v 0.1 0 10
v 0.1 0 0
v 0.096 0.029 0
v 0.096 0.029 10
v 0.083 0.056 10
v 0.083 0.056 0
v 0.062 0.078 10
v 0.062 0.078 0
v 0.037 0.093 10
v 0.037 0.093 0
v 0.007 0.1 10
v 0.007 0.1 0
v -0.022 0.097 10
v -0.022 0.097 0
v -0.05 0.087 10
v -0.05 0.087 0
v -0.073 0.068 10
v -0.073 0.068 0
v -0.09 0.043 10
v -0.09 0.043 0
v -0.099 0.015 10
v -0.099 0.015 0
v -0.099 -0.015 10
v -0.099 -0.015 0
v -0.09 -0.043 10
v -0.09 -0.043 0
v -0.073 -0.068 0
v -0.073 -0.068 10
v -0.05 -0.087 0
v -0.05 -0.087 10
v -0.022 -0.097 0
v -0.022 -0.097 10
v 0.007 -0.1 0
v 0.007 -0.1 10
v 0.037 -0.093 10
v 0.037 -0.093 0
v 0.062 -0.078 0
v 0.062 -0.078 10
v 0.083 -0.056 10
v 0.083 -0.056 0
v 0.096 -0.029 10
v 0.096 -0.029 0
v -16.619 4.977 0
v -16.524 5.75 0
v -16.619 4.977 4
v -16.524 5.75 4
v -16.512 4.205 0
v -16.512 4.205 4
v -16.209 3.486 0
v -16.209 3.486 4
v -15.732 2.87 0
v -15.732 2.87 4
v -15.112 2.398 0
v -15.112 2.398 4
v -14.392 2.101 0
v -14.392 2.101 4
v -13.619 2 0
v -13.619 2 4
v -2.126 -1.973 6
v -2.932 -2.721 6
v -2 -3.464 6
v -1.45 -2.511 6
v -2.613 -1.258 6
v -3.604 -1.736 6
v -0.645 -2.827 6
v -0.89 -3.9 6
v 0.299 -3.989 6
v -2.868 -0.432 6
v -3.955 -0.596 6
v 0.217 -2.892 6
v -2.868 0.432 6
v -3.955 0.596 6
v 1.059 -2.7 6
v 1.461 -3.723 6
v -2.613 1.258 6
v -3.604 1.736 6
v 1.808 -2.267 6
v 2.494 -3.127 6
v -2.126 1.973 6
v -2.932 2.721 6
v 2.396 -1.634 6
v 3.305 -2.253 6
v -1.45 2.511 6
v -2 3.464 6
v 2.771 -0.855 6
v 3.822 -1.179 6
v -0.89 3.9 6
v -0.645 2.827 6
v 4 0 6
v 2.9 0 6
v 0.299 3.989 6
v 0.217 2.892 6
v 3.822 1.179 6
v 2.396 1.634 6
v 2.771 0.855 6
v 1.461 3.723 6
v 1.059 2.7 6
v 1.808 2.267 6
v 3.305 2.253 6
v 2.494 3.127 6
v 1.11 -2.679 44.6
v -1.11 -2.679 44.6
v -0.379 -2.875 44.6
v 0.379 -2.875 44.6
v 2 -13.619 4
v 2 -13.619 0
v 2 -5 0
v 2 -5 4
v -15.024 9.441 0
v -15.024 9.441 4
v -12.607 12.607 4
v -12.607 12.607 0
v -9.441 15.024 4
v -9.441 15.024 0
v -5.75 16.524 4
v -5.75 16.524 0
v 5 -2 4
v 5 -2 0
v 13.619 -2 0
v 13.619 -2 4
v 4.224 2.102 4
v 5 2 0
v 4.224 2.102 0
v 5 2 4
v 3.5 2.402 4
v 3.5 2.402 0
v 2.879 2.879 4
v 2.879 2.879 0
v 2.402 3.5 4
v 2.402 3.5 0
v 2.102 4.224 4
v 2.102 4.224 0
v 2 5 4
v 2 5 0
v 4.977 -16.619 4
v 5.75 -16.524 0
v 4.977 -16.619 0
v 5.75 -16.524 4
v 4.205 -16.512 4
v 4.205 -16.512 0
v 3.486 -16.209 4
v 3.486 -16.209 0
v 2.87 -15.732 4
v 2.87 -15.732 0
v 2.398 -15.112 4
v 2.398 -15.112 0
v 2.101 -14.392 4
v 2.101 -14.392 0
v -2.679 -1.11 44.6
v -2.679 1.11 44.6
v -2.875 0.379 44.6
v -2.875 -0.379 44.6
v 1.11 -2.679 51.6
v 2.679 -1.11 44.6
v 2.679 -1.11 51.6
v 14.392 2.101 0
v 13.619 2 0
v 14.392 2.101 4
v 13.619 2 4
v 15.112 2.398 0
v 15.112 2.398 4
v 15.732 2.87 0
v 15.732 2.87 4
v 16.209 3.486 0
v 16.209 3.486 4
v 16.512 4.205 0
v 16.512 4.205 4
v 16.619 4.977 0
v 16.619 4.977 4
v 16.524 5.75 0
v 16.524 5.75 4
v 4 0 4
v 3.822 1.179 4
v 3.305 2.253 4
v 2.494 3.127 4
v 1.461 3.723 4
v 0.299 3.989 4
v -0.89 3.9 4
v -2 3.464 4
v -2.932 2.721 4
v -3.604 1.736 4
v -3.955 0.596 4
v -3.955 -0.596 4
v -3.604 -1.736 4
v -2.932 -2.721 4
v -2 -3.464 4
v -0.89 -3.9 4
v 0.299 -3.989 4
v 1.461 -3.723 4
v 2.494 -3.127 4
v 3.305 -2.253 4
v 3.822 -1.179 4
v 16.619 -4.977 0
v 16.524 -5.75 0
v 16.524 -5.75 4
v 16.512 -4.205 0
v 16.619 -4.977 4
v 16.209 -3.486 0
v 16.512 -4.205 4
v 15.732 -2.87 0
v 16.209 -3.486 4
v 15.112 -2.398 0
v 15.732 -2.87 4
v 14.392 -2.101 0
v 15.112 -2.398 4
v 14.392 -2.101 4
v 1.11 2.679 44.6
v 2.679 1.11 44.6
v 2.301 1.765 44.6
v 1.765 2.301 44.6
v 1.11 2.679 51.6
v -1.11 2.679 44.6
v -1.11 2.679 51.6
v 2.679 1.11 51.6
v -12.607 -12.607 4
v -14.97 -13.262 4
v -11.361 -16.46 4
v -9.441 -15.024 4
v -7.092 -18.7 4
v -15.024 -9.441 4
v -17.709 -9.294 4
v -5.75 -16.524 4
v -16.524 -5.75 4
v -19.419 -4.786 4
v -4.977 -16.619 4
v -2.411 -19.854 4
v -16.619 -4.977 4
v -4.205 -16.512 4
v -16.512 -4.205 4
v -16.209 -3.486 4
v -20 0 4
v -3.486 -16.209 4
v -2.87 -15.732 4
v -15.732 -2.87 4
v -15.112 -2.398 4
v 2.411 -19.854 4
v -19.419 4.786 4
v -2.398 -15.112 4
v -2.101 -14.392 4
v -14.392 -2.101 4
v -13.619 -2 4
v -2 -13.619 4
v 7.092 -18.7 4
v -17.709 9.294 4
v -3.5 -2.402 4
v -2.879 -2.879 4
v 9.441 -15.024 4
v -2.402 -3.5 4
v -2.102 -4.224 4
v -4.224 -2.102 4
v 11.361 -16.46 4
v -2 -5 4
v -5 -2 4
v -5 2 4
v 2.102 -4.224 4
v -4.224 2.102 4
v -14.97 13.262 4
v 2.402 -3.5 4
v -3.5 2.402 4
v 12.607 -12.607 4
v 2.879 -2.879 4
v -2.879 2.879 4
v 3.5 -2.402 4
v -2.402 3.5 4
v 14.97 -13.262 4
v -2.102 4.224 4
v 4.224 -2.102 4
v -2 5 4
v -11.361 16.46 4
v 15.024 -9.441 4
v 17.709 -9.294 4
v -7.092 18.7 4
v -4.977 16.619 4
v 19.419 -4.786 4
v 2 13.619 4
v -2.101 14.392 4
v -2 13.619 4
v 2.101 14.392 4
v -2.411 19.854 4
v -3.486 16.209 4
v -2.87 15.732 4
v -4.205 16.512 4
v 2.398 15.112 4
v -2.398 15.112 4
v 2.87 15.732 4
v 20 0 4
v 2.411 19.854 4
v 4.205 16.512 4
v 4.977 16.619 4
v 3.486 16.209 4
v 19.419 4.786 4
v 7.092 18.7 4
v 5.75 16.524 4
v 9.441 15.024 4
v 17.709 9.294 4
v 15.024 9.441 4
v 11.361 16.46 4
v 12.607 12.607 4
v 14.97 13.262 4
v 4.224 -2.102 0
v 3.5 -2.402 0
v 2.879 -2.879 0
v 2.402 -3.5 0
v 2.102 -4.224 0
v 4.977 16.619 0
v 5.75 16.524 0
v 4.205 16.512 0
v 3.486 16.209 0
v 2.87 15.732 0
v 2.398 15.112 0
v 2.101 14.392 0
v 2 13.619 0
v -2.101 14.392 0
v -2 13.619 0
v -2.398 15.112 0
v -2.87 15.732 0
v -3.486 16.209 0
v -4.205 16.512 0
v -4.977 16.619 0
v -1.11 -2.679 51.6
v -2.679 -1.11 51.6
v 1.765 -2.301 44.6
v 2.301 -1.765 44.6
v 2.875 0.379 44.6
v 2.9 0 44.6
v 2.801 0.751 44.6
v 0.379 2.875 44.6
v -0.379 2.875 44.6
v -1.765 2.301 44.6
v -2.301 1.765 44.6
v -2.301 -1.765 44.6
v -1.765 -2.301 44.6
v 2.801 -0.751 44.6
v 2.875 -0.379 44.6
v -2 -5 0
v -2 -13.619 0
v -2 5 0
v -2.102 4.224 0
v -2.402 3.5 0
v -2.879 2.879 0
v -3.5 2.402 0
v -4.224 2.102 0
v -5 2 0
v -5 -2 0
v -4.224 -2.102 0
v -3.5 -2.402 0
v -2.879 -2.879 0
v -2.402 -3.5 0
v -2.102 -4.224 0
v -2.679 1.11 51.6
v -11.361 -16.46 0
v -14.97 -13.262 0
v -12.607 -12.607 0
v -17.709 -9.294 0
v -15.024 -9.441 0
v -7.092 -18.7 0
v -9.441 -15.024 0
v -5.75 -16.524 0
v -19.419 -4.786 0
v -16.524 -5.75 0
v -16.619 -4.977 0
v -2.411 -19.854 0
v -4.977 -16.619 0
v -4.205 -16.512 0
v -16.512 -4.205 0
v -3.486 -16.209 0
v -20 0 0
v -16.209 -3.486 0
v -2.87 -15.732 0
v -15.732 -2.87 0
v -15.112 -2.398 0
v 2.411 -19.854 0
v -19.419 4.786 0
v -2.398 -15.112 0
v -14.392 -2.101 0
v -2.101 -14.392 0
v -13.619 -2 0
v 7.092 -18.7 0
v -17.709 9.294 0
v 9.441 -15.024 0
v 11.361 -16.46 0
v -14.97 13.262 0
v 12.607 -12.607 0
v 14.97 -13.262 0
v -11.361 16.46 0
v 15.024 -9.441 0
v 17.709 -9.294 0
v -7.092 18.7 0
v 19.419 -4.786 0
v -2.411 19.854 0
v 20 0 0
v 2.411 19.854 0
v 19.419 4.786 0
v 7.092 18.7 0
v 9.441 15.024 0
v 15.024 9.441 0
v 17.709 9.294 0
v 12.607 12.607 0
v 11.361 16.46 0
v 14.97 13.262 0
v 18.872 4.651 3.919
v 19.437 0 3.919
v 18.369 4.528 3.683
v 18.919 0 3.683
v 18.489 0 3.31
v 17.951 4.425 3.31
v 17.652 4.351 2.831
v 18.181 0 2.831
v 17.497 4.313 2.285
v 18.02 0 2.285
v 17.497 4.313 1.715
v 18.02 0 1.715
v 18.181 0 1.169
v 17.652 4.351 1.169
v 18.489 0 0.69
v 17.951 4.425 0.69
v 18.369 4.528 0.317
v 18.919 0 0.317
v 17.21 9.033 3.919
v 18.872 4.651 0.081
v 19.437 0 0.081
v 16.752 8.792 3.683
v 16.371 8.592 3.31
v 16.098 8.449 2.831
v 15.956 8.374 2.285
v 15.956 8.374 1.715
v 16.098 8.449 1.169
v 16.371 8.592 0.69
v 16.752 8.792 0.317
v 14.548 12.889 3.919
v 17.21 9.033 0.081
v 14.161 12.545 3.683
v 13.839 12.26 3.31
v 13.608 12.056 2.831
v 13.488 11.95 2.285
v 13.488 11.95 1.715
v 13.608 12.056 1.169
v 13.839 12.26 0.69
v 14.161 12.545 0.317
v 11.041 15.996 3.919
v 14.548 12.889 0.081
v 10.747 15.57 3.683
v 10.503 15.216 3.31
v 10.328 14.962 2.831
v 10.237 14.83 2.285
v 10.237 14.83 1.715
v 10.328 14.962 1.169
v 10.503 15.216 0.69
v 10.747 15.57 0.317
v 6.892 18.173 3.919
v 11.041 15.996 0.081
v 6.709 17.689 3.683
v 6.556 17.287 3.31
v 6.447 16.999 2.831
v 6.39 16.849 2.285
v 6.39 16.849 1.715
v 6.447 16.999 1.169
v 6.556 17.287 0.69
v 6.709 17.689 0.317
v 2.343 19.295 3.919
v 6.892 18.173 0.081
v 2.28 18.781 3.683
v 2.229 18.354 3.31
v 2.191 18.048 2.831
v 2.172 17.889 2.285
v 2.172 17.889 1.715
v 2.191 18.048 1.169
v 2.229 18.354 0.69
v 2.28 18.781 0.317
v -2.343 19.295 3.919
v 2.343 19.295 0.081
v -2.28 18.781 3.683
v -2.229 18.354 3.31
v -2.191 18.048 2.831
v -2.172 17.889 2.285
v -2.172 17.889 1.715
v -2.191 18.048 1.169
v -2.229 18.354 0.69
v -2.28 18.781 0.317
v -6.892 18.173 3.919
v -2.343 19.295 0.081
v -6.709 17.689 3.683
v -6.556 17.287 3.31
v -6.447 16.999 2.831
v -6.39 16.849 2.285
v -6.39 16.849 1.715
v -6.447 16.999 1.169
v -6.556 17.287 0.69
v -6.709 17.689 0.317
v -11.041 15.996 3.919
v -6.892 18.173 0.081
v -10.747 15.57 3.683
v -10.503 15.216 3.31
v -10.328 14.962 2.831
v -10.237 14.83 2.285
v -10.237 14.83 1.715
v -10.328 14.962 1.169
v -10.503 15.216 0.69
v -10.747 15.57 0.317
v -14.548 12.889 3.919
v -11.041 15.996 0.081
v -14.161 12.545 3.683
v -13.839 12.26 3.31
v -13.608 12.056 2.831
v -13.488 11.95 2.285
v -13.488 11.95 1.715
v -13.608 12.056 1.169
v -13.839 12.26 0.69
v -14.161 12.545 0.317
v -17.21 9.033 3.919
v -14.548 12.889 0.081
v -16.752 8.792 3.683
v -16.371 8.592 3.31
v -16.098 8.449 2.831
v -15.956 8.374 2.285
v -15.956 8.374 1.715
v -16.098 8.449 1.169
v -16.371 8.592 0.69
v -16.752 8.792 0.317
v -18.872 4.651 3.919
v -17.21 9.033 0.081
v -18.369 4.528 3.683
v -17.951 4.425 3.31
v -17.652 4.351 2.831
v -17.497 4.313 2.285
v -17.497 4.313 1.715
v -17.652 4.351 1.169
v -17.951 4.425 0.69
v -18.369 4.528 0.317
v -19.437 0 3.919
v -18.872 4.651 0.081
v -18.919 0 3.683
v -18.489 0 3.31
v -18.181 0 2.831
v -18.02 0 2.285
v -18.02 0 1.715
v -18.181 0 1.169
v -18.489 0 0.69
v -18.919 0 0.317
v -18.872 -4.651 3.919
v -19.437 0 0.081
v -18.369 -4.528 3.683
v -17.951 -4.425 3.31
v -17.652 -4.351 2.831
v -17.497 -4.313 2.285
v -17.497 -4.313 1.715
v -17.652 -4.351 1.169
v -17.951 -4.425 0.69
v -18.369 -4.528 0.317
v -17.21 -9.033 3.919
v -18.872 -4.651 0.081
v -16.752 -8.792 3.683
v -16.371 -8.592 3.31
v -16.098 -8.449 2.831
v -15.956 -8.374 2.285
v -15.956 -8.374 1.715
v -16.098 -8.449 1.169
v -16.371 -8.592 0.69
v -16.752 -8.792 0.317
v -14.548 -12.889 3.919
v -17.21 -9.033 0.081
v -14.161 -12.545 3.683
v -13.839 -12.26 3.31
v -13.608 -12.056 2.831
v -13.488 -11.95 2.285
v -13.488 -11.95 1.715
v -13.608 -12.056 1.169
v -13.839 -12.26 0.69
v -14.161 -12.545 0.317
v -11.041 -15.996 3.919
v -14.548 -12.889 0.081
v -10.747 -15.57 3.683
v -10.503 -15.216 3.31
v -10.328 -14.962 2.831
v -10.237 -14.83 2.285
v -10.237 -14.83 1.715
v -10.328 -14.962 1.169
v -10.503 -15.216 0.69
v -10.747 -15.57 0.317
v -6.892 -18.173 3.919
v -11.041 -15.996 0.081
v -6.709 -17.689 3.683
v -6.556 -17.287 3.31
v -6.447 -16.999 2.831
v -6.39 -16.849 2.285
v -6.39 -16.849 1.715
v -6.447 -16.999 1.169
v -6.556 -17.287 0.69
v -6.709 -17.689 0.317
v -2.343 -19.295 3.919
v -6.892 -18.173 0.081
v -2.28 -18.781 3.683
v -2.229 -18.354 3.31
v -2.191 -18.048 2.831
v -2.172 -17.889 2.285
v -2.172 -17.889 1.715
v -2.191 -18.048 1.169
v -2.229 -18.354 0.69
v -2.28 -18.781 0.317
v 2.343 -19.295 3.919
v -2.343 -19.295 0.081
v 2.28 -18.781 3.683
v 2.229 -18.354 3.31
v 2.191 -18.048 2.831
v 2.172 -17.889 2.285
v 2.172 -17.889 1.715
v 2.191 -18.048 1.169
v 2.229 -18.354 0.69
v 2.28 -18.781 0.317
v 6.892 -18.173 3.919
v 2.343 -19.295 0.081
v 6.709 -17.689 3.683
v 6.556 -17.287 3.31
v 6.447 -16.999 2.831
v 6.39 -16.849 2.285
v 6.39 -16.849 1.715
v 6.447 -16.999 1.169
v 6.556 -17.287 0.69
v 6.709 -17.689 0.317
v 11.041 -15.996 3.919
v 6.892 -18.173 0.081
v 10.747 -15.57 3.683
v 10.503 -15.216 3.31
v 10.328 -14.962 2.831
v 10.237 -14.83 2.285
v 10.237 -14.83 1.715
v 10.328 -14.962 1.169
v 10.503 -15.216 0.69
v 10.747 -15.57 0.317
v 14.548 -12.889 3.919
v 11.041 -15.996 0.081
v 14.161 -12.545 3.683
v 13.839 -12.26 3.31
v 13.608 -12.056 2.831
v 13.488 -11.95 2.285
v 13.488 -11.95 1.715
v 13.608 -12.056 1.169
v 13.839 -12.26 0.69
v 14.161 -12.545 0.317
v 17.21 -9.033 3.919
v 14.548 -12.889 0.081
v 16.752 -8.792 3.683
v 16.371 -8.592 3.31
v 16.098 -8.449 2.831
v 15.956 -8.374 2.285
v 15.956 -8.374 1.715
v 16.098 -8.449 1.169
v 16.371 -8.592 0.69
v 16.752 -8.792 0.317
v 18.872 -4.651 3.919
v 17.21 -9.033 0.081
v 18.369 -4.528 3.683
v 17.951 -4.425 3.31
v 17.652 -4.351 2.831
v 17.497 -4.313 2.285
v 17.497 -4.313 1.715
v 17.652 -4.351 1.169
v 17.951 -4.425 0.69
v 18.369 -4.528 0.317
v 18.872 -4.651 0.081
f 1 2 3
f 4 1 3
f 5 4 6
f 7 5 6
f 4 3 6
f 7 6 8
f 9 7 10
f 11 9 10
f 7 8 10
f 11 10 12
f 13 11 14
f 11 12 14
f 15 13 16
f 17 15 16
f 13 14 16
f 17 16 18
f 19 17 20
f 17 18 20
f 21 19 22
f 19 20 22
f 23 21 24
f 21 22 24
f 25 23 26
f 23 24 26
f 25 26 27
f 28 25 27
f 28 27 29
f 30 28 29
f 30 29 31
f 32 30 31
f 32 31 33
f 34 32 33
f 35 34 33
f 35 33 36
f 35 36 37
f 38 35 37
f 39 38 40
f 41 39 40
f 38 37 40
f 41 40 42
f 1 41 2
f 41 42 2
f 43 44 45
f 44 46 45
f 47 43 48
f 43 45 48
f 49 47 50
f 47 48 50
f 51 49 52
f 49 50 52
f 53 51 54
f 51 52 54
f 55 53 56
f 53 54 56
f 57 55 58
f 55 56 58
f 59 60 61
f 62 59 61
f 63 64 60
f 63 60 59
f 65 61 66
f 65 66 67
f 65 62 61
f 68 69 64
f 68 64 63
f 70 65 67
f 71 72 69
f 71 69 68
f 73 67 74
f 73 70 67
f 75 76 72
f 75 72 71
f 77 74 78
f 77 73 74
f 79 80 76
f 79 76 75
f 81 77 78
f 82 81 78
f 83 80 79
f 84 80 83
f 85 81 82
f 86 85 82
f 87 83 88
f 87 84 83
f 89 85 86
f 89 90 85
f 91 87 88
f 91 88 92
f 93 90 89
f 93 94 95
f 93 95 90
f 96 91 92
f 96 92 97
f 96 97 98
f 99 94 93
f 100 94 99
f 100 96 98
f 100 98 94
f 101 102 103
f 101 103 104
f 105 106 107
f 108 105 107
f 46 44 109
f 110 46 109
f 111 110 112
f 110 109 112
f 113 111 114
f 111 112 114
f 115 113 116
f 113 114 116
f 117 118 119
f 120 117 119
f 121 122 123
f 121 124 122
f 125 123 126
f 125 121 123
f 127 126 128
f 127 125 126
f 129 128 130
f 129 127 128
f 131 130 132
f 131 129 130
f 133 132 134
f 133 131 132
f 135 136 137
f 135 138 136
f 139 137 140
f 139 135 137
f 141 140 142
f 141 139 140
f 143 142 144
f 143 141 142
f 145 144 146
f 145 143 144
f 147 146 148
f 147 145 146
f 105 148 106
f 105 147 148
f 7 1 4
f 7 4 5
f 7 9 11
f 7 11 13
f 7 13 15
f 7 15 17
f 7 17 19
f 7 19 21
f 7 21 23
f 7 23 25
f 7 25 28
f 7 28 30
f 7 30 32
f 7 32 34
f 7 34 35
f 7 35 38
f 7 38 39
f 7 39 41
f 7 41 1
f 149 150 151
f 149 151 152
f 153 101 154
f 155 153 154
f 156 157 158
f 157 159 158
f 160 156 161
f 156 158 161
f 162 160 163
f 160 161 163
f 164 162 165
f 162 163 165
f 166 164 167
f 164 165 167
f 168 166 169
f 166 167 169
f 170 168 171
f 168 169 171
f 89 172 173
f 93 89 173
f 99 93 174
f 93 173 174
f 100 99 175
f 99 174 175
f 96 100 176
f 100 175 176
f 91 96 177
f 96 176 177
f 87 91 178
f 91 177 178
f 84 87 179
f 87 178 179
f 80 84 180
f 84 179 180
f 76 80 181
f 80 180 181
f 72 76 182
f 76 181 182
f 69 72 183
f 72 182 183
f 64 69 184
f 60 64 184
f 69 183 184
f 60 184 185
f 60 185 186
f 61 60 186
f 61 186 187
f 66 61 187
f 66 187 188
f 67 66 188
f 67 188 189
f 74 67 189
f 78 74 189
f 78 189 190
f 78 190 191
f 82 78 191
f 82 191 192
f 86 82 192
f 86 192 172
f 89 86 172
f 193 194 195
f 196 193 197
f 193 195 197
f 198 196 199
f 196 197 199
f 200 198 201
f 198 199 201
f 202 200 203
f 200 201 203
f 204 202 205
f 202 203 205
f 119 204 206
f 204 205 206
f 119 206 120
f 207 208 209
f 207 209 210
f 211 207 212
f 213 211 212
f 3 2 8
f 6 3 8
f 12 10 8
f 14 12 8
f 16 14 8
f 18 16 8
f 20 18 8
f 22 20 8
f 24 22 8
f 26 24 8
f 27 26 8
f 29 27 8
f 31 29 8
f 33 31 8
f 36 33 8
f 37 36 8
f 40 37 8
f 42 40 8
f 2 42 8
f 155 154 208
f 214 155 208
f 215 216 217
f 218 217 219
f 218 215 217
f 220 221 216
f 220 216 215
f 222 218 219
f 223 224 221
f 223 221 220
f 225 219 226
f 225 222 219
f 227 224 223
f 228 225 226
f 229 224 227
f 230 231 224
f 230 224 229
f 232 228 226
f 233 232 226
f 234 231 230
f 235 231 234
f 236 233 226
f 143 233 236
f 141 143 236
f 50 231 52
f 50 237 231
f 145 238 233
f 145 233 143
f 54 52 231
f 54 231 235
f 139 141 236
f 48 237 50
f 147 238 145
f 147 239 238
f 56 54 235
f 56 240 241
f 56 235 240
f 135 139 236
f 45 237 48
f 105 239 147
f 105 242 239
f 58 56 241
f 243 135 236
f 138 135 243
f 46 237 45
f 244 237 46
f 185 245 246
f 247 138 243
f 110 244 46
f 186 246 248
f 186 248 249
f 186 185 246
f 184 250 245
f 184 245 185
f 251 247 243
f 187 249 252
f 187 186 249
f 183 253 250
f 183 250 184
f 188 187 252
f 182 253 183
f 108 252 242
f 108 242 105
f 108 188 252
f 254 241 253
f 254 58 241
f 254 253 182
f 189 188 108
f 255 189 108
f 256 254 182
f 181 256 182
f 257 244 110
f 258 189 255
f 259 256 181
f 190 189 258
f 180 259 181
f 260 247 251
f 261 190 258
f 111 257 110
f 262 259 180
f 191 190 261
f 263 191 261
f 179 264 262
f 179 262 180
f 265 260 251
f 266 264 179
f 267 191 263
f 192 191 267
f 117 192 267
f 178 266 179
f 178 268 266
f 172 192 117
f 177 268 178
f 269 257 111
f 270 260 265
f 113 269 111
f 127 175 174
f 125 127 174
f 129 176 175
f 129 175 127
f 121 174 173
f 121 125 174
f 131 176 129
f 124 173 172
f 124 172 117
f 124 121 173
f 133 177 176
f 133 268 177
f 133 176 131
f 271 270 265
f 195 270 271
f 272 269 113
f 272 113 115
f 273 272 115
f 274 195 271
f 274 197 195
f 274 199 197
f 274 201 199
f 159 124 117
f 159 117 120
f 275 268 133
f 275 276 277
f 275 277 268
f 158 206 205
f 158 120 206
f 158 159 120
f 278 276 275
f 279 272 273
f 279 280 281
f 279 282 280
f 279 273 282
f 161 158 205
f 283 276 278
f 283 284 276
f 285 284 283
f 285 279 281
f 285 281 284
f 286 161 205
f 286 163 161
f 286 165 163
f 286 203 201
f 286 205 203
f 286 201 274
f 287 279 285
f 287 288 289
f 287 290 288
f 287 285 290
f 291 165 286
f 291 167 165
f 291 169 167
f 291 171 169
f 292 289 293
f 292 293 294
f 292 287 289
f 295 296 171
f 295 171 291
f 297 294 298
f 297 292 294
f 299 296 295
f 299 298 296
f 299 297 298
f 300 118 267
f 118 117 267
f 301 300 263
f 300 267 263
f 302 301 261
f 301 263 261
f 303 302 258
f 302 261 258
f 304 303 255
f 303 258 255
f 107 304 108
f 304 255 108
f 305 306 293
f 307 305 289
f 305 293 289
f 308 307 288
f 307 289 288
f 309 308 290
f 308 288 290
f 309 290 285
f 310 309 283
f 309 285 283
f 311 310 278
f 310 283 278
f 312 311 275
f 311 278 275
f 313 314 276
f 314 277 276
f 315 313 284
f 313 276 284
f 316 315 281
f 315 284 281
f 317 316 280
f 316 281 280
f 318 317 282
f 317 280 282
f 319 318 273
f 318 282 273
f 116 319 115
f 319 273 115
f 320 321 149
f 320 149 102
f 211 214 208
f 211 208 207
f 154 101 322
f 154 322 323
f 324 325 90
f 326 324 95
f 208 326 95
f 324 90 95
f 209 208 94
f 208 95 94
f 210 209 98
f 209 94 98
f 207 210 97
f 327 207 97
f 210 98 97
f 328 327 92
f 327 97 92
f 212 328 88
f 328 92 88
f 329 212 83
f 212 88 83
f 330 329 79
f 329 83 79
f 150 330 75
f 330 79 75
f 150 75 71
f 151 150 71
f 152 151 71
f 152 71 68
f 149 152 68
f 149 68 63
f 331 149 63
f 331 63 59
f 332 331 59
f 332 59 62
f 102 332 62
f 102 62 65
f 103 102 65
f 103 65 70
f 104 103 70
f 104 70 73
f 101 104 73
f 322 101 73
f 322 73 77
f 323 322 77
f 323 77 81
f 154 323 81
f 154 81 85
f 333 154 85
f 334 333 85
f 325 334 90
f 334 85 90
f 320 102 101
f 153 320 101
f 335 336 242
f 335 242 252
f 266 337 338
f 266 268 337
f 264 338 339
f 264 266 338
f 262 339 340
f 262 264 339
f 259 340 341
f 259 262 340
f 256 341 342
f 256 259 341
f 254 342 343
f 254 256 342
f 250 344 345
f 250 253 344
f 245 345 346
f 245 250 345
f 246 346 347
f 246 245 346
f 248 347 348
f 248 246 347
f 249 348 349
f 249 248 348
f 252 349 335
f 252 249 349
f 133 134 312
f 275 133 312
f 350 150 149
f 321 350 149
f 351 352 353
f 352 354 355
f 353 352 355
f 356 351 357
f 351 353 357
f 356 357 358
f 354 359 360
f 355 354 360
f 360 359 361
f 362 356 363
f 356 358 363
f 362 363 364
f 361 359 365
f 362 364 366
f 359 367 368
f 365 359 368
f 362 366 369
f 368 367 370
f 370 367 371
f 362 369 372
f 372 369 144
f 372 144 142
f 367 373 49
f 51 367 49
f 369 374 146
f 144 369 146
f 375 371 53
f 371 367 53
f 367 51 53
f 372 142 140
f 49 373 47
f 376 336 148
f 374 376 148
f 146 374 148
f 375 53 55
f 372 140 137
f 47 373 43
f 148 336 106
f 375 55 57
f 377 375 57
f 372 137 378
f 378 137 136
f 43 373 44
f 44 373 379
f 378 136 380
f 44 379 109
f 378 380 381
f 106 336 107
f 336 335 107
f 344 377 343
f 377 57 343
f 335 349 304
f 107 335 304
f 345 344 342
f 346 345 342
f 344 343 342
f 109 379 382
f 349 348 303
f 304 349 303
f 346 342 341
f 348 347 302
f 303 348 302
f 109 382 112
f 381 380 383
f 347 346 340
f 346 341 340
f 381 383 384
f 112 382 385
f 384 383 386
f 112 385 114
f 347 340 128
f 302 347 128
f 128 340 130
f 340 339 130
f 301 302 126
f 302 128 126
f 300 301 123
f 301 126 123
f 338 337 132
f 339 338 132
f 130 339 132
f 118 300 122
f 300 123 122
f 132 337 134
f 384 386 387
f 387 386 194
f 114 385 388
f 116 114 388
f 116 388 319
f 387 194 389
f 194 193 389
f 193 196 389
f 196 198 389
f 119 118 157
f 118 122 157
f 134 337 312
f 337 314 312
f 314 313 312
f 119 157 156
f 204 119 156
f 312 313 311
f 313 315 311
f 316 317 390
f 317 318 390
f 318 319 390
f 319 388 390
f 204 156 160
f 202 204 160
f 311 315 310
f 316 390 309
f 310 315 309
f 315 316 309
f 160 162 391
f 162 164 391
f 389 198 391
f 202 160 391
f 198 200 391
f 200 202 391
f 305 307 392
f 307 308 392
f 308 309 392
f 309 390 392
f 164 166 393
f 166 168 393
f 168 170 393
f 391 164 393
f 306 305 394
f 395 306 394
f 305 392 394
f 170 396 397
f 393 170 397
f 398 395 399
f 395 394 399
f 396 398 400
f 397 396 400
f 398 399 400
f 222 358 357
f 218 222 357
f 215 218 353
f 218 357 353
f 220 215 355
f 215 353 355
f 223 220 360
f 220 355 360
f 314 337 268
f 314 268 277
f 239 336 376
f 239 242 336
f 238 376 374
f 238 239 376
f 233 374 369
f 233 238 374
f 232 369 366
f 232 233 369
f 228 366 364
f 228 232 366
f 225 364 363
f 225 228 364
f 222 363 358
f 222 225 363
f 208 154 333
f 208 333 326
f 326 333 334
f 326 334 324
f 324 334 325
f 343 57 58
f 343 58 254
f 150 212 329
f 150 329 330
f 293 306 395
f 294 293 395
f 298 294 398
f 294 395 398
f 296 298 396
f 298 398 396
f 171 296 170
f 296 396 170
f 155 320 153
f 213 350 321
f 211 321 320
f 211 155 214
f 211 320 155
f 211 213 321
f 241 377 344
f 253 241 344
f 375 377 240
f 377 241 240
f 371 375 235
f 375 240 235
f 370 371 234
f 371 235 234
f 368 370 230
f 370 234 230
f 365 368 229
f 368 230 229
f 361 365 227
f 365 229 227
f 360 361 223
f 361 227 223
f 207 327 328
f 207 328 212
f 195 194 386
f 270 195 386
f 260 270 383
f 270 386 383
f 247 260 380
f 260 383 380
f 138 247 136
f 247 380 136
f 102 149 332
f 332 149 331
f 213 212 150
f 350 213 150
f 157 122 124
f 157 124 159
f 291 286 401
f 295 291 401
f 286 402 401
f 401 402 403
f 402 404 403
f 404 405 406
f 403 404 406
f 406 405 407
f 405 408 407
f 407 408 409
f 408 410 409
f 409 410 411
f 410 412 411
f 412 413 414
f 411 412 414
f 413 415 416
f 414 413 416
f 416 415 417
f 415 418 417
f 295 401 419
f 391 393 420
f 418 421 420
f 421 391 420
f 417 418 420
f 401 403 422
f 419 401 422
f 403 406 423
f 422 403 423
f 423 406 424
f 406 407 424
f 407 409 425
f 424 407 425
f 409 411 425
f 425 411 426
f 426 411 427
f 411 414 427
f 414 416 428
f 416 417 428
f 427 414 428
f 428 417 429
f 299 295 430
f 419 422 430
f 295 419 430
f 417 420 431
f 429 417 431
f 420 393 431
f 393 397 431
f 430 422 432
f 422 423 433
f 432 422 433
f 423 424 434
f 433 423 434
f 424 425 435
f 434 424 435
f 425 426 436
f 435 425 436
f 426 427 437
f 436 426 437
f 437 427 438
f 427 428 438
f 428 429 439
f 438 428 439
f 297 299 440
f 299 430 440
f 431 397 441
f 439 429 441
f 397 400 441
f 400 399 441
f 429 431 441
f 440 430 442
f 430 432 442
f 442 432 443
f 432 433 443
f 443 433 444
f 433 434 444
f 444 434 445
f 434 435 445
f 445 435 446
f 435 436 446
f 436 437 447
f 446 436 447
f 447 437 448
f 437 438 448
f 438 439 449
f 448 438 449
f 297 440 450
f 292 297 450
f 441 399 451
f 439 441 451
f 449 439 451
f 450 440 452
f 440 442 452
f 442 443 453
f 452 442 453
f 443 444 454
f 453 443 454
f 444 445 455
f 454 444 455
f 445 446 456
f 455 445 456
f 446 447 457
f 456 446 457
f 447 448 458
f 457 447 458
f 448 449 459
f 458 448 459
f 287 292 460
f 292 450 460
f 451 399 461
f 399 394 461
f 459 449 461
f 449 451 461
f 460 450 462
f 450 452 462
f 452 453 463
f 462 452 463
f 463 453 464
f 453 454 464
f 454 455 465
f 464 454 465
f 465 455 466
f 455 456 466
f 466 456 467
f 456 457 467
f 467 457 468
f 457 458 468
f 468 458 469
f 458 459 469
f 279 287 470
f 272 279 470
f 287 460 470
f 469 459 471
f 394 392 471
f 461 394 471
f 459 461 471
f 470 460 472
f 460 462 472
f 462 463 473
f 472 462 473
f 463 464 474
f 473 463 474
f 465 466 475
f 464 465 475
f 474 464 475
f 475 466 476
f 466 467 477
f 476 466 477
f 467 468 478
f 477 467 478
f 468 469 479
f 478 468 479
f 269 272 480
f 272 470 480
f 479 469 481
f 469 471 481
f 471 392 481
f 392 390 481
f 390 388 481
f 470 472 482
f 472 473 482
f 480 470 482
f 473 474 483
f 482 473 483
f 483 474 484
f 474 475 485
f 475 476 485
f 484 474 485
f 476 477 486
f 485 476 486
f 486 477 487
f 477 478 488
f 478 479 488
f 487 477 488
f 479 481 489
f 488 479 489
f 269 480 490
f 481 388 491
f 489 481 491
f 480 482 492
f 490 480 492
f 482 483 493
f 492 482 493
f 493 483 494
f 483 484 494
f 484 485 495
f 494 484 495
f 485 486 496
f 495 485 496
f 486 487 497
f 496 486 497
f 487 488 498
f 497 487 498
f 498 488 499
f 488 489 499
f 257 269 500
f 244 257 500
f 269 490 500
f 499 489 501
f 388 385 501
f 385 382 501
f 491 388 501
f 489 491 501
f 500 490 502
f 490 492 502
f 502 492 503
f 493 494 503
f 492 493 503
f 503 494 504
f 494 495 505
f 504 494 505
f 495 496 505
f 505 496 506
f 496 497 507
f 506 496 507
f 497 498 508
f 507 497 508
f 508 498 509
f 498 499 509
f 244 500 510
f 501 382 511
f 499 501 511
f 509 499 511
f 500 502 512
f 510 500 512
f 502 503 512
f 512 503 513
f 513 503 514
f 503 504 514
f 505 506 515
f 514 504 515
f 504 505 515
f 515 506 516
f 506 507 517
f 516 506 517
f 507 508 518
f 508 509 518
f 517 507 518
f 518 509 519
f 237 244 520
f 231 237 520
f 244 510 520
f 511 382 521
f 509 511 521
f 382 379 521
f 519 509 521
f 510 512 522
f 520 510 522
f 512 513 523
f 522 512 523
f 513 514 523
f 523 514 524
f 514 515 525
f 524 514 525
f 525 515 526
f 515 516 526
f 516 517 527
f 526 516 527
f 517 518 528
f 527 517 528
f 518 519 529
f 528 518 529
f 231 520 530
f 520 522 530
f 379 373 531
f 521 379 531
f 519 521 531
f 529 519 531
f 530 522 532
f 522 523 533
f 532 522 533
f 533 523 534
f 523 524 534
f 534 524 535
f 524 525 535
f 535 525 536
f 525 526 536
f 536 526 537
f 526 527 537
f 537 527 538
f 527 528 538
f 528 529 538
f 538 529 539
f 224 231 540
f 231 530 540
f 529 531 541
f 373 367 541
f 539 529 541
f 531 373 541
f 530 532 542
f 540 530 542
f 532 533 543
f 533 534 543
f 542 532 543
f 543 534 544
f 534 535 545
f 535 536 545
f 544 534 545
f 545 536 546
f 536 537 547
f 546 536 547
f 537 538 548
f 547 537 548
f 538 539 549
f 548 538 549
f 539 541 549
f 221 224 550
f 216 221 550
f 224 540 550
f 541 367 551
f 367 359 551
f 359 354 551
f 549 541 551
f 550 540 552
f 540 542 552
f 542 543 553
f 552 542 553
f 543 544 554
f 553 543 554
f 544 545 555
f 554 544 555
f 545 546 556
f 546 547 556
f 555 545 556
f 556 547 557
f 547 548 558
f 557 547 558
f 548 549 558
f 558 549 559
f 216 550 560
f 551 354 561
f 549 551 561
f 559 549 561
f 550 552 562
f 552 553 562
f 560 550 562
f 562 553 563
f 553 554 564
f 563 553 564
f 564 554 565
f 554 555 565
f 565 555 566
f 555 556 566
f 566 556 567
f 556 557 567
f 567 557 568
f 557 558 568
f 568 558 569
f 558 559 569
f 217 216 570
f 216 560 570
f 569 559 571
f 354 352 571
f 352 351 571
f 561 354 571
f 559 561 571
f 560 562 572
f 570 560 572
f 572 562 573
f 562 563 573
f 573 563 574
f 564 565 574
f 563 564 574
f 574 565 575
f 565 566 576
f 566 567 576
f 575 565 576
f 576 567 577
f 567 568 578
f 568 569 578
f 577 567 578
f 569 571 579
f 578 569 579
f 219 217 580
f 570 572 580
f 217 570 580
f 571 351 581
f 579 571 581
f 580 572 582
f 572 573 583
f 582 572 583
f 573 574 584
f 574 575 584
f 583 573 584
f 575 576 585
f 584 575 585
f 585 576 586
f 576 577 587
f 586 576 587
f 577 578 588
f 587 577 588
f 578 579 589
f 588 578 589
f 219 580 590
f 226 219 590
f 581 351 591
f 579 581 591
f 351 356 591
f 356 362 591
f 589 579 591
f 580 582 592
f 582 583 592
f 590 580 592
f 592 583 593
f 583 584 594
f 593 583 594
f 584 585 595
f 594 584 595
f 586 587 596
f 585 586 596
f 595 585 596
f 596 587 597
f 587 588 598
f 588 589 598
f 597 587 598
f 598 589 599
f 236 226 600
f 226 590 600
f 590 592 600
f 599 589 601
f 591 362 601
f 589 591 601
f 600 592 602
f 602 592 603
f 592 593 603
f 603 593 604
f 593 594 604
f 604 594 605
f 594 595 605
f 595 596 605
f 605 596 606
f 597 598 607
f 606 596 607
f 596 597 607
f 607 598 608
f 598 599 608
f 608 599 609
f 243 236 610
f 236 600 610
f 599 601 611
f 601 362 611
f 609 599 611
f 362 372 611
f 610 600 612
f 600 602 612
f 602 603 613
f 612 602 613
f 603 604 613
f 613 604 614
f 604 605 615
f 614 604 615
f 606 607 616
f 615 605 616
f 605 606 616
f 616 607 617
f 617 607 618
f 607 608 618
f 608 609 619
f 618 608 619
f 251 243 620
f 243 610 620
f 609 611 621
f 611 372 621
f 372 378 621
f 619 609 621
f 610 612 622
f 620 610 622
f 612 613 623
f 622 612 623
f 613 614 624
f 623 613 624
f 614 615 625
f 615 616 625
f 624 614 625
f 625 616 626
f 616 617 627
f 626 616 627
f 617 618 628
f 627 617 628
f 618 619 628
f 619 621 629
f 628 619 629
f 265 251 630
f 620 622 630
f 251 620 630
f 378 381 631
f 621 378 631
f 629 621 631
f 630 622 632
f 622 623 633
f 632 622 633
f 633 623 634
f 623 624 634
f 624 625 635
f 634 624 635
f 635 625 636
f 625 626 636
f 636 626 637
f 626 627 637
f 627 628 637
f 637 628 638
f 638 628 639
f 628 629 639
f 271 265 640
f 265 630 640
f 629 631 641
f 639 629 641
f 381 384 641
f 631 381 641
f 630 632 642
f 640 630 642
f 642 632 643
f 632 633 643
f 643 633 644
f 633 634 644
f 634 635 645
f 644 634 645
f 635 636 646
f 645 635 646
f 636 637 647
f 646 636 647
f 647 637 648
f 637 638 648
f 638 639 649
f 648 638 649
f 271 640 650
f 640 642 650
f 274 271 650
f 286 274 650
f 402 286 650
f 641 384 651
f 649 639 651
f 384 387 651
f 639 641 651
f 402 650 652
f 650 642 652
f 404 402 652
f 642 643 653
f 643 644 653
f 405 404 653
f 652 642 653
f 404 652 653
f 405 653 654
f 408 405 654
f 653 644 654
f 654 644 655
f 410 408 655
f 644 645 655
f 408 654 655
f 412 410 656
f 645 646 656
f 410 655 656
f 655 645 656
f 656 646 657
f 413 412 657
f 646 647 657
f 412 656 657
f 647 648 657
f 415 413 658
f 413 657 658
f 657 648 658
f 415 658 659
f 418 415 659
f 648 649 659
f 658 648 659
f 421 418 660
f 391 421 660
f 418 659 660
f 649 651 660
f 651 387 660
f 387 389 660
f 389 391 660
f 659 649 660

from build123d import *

# Parameters (mm, degrees)
CYLINDER001_R     = 0.1
CYLINDER001_DEPTH = 10
CYLINDER002_R     = 2.9
CYLINDER002_DEPTH = 44.6
CYLINDER003_R     = 4
CYLINDER003_DEPTH = 6
TORUS_R           = 2
CYLINDER_R        = 20
CYLINDER_DEPTH    = 4
POCKET_DEPTH      = 4.001
FILLET_R          = 3
FILLET001_R       = 3
FILLET002_R       = 3
POCKET001_DEPTH   = 5
PAD_DEPTH         = 7


with BuildPart() as cylinder001:
    # Cylinder001 → Cylinder001 (new body)
    with BuildSketch(Plane.XY):
        Circle(CYLINDER001_R)
    extrude(amount=CYLINDER001_DEPTH)


with BuildPart() as cylinder002:
    # Cylinder002 → Cylinder002 (new body)
    with BuildSketch(Plane.XY):
        Circle(CYLINDER002_R)
    extrude(amount=CYLINDER002_DEPTH)


with BuildPart() as cylinder003:
    # Cylinder003 → Cylinder003 (new body)
    with BuildSketch(Plane.XY):
        Circle(CYLINDER003_R)
    extrude(amount=CYLINDER003_DEPTH)


with BuildPart() as torus:
    # Torus → Torus (revolve)
    with BuildSketch(Plane(origin=(0, 0, 2), x_dir=(1, 0, 0), z_dir=(0, -1, 0))):
        with Locations((20, 0)):
            Circle(TORUS_R)
    revolve(axis=Axis((0, 0, 2), (0, 0, 1)))


with BuildPart() as body002:
    # Cylinder → Cylinder (new body)
    with BuildSketch(Plane.XY):
        Circle(CYLINDER_R)
    extrude(amount=CYLINDER_DEPTH)

    # Sketch001 (on DatumPlane) → Pocket (cut, through all)
    with BuildSketch(Plane(origin=(0, 0, 0), x_dir=(1, 0, 0), z_dir=(0, 0, -1))):
        with BuildLine():
            Line((2, 17), (2, 2))
            Line((2, 2), (17, 2))
            ThreePointArc((17, 2), (12.606602, 12.606602), (2, 17))
        make_face()
        with BuildLine():
            Line((-2, 17), (-2, 2))
            Line((-17, 2), (-2, 2))
            ThreePointArc((-2, 17), (-12.606602, 12.606602), (-17, 2))
        make_face()
        with BuildLine():
            Line((2, -2), (17, -2))
            ThreePointArc((2, -17), (12.606602, -12.606602), (17, -2))
            Line((2, -2), (2, -17))
        make_face()
        with BuildLine():
            Line((-2, -2), (-2, -17))
            ThreePointArc((-17, -2), (-12.606602, -12.606602), (-2, -17))
            Line((-17, -2), (-2, -2))
        make_face()
    extrude(amount=-POCKET_DEPTH, mode=Mode.SUBTRACT)

    # Fillet
    fillet_edges = [body002.edges().sort_by_distance(p)[0] for p in [
        (-2, -17, 2),
    ]]
    fillet(fillet_edges, radius=FILLET_R)

    # Fillet001
    fillet001_edges = [body002.edges().sort_by_distance(p)[0] for p in [
        (-17, 2, 2),
        (2, -17, 2),
        (17, -2, 2),
        (-17, -2, 2),
        (-2, 17, 2),
        (2, 17, 2),
        (17, 2, 2),
    ]]
    fillet(fillet001_edges, radius=FILLET001_R)

    # Fillet002
    fillet002_edges = [body002.edges().sort_by_distance(p)[0] for p in [
        (2, -2, 2),
        (2, 2, 2),
        (-2, 2, 2),
        (-2, -2, 2),
    ]]
    fillet(fillet002_edges, radius=FILLET002_R)

    # Cut: cut Torus
    add(torus.part, mode=Mode.SUBTRACT)

    # Sketch (on DatumPlane) → Pocket001 (cut)
    with BuildSketch(Plane(origin=(0, 0, 0), x_dir=(1, 0, 0), z_dir=(0, 0, -1))):
        Polygon((1.109782, -2.679251), (2.679251, -1.109782), (2.679251, 1.109782), (1.109782, 2.679251), (-1.109782, 2.679251), (-2.679251, 1.109782), (-2.679251, -1.109782), (-1.109782, -2.679251), align=None)
    extrude(amount=-POCKET001_DEPTH, mode=Mode.SUBTRACT)

    # Fusion: union Cylinder002, Cylinder003
    add(cylinder002.part)
    add(cylinder003.part)

    # Sketch002 (on DatumPlane) → Pad (new body)
    with BuildSketch(Plane.XY.offset(44.6)):
        Polygon((2.679251, 1.109782), (1.109782, 2.679251), (-1.109782, 2.679251), (-2.679251, 1.109782), (-2.679251, -1.109782), (-1.109782, -2.679251), (1.109782, -2.679251), (2.679251, -1.109782), align=None)
    extrude(amount=PAD_DEPTH)


solid = Compound([cylinder001.part, body002.part])
